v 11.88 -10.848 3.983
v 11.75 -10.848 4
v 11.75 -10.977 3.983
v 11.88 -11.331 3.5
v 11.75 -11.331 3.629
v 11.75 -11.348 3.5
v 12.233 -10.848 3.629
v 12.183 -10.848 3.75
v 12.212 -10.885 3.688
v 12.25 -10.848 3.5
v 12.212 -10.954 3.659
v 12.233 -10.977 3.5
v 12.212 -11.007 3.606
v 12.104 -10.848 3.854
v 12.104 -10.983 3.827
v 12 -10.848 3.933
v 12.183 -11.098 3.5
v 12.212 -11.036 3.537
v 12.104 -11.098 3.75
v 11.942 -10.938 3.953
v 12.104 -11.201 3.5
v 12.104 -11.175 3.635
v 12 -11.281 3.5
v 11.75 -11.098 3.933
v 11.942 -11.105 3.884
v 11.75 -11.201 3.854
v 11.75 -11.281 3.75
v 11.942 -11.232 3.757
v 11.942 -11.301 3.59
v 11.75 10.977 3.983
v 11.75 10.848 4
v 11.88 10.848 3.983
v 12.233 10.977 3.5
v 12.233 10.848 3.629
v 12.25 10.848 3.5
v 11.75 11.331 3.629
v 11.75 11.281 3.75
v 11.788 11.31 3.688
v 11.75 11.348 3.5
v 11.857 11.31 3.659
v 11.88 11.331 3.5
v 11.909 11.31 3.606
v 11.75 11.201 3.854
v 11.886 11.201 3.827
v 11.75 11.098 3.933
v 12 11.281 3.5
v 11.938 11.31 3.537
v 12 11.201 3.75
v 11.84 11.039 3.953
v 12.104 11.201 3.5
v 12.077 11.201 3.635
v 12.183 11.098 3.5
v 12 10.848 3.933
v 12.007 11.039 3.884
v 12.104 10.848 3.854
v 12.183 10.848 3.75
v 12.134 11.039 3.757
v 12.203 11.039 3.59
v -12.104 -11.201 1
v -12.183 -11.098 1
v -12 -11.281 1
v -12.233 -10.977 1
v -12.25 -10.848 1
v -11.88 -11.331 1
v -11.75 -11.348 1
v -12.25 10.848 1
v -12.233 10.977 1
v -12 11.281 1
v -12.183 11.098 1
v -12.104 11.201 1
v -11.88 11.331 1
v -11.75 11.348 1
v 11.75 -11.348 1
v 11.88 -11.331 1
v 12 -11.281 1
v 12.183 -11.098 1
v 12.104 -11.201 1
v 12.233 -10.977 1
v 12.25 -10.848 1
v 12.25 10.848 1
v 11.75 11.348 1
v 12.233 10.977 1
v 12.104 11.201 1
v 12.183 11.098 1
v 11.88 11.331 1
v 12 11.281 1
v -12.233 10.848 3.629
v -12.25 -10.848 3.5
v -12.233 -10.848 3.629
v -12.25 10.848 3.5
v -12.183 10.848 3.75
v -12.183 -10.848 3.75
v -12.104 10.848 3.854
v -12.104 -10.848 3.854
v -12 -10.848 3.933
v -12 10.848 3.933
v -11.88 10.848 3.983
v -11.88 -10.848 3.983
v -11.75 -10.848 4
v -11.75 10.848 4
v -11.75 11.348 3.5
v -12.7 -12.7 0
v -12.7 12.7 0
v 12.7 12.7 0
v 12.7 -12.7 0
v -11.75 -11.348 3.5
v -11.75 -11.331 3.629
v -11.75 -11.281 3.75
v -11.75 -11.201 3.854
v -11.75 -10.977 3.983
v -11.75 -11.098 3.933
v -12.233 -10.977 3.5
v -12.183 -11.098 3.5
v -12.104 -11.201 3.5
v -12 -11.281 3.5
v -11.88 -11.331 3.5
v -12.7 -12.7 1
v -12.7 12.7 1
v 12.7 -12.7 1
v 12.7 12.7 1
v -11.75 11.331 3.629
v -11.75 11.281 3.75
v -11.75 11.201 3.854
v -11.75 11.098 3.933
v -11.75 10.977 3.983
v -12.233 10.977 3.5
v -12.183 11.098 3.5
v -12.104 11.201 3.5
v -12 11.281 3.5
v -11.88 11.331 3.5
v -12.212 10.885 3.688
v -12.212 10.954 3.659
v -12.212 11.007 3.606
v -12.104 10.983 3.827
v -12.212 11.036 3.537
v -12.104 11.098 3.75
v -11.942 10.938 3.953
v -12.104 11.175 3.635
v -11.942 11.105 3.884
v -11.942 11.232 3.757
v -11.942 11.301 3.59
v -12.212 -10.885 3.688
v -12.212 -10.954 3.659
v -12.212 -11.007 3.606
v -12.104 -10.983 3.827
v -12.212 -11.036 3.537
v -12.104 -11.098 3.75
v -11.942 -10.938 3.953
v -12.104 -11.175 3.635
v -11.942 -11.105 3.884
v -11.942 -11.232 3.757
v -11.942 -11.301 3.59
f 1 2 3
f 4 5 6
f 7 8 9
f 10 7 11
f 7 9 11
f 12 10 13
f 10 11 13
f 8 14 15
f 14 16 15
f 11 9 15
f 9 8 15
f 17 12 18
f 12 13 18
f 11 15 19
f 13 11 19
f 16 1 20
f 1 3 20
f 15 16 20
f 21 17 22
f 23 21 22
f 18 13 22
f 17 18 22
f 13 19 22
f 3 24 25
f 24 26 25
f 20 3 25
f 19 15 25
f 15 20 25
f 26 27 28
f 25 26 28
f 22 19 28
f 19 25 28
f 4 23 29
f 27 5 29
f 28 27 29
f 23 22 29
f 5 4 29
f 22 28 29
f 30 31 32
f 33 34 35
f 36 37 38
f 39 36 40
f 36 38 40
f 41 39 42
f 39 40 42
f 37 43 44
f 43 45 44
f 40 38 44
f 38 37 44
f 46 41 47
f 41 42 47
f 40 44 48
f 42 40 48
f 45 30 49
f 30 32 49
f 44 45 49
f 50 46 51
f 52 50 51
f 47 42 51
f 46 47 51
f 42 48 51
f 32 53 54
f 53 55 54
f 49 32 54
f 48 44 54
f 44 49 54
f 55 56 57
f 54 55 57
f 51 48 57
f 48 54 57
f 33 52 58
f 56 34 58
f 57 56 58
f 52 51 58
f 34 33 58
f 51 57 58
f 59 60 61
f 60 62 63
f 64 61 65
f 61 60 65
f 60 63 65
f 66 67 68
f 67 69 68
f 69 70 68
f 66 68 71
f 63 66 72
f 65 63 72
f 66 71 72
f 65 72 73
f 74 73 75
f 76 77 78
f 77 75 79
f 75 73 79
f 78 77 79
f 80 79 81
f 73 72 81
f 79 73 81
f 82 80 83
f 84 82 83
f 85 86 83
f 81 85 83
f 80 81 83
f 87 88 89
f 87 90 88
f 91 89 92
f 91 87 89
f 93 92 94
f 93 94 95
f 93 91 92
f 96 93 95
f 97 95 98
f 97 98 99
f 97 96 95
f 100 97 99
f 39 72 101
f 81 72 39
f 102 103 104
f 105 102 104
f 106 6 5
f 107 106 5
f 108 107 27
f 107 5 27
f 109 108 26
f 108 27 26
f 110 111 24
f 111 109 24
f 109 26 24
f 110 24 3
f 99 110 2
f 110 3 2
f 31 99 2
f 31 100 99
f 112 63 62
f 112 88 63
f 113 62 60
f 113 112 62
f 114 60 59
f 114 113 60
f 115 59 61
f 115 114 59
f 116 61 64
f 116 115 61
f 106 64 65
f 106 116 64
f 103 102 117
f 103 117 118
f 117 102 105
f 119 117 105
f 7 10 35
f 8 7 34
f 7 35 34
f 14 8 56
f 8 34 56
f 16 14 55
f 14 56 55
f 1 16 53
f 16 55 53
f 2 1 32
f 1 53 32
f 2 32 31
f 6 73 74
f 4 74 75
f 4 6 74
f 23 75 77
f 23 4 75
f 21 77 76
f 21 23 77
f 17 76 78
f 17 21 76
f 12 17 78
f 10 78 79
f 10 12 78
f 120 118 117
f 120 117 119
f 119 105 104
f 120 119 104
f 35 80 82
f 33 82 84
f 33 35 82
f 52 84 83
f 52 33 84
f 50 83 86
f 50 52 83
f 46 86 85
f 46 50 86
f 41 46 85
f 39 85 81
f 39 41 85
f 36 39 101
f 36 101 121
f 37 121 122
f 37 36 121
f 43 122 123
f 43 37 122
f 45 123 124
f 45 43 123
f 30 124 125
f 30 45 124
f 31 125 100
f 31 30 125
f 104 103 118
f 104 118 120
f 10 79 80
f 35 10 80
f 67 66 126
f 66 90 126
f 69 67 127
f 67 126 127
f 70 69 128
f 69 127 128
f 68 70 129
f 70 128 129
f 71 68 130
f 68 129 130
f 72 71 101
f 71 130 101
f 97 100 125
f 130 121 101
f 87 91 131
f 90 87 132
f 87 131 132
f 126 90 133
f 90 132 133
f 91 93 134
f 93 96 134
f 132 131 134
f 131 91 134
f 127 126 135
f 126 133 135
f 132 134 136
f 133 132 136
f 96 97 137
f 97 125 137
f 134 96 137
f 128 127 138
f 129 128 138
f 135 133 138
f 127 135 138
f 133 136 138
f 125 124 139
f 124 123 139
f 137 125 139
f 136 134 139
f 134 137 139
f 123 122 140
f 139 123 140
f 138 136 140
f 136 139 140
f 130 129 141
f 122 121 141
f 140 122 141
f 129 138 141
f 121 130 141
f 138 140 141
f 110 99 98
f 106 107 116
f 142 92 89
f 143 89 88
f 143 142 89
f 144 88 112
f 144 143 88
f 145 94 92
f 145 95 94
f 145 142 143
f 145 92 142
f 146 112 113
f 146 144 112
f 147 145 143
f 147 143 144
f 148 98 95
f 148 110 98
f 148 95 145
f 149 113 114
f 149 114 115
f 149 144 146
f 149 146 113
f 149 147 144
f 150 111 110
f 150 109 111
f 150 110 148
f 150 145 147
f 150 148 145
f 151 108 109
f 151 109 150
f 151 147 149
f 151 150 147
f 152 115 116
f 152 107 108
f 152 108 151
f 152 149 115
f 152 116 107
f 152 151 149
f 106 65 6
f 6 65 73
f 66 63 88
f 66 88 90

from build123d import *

# Parameters (mm, degrees)
F0_W     = 25.4
F0_H     = 25.4
F1_DEPTH = 1
F2_W     = 24.500586
F2_H     = 22.695856
F3_DEPTH = 3
F4_R     = 0.5


with BuildPart() as f1:
    # F0 (on Top) → F1 (new body)
    with BuildSketch(Plane.XY):
        Rectangle(F0_W, F0_H)
    extrude(amount=F1_DEPTH)


with BuildPart() as f3:
    # F2 (on face) → F3 (new body)
    with BuildSketch(Plane.XY.offset(1)):
        Rectangle(F2_W, F2_H)
    extrude(amount=F3_DEPTH)

    # F4
    f4_edges = [f3.edges().sort_by_distance(p)[0] for p in [
        (0, -11.347928, 4),
        (12.250293, 0, 4),
        (0, 11.347928, 4),
        (-12.250293, 0, 4),
        (12.250293, -11.347928, 2.5),
        (-12.250293, -11.347928, 2.5),
        (-12.250293, 11.347928, 2.5),
        (12.250293, 11.347928, 2.5),
    ]]
    fillet(f4_edges, radius=F4_R)


solid = Compound([f1.part, f3.part])
